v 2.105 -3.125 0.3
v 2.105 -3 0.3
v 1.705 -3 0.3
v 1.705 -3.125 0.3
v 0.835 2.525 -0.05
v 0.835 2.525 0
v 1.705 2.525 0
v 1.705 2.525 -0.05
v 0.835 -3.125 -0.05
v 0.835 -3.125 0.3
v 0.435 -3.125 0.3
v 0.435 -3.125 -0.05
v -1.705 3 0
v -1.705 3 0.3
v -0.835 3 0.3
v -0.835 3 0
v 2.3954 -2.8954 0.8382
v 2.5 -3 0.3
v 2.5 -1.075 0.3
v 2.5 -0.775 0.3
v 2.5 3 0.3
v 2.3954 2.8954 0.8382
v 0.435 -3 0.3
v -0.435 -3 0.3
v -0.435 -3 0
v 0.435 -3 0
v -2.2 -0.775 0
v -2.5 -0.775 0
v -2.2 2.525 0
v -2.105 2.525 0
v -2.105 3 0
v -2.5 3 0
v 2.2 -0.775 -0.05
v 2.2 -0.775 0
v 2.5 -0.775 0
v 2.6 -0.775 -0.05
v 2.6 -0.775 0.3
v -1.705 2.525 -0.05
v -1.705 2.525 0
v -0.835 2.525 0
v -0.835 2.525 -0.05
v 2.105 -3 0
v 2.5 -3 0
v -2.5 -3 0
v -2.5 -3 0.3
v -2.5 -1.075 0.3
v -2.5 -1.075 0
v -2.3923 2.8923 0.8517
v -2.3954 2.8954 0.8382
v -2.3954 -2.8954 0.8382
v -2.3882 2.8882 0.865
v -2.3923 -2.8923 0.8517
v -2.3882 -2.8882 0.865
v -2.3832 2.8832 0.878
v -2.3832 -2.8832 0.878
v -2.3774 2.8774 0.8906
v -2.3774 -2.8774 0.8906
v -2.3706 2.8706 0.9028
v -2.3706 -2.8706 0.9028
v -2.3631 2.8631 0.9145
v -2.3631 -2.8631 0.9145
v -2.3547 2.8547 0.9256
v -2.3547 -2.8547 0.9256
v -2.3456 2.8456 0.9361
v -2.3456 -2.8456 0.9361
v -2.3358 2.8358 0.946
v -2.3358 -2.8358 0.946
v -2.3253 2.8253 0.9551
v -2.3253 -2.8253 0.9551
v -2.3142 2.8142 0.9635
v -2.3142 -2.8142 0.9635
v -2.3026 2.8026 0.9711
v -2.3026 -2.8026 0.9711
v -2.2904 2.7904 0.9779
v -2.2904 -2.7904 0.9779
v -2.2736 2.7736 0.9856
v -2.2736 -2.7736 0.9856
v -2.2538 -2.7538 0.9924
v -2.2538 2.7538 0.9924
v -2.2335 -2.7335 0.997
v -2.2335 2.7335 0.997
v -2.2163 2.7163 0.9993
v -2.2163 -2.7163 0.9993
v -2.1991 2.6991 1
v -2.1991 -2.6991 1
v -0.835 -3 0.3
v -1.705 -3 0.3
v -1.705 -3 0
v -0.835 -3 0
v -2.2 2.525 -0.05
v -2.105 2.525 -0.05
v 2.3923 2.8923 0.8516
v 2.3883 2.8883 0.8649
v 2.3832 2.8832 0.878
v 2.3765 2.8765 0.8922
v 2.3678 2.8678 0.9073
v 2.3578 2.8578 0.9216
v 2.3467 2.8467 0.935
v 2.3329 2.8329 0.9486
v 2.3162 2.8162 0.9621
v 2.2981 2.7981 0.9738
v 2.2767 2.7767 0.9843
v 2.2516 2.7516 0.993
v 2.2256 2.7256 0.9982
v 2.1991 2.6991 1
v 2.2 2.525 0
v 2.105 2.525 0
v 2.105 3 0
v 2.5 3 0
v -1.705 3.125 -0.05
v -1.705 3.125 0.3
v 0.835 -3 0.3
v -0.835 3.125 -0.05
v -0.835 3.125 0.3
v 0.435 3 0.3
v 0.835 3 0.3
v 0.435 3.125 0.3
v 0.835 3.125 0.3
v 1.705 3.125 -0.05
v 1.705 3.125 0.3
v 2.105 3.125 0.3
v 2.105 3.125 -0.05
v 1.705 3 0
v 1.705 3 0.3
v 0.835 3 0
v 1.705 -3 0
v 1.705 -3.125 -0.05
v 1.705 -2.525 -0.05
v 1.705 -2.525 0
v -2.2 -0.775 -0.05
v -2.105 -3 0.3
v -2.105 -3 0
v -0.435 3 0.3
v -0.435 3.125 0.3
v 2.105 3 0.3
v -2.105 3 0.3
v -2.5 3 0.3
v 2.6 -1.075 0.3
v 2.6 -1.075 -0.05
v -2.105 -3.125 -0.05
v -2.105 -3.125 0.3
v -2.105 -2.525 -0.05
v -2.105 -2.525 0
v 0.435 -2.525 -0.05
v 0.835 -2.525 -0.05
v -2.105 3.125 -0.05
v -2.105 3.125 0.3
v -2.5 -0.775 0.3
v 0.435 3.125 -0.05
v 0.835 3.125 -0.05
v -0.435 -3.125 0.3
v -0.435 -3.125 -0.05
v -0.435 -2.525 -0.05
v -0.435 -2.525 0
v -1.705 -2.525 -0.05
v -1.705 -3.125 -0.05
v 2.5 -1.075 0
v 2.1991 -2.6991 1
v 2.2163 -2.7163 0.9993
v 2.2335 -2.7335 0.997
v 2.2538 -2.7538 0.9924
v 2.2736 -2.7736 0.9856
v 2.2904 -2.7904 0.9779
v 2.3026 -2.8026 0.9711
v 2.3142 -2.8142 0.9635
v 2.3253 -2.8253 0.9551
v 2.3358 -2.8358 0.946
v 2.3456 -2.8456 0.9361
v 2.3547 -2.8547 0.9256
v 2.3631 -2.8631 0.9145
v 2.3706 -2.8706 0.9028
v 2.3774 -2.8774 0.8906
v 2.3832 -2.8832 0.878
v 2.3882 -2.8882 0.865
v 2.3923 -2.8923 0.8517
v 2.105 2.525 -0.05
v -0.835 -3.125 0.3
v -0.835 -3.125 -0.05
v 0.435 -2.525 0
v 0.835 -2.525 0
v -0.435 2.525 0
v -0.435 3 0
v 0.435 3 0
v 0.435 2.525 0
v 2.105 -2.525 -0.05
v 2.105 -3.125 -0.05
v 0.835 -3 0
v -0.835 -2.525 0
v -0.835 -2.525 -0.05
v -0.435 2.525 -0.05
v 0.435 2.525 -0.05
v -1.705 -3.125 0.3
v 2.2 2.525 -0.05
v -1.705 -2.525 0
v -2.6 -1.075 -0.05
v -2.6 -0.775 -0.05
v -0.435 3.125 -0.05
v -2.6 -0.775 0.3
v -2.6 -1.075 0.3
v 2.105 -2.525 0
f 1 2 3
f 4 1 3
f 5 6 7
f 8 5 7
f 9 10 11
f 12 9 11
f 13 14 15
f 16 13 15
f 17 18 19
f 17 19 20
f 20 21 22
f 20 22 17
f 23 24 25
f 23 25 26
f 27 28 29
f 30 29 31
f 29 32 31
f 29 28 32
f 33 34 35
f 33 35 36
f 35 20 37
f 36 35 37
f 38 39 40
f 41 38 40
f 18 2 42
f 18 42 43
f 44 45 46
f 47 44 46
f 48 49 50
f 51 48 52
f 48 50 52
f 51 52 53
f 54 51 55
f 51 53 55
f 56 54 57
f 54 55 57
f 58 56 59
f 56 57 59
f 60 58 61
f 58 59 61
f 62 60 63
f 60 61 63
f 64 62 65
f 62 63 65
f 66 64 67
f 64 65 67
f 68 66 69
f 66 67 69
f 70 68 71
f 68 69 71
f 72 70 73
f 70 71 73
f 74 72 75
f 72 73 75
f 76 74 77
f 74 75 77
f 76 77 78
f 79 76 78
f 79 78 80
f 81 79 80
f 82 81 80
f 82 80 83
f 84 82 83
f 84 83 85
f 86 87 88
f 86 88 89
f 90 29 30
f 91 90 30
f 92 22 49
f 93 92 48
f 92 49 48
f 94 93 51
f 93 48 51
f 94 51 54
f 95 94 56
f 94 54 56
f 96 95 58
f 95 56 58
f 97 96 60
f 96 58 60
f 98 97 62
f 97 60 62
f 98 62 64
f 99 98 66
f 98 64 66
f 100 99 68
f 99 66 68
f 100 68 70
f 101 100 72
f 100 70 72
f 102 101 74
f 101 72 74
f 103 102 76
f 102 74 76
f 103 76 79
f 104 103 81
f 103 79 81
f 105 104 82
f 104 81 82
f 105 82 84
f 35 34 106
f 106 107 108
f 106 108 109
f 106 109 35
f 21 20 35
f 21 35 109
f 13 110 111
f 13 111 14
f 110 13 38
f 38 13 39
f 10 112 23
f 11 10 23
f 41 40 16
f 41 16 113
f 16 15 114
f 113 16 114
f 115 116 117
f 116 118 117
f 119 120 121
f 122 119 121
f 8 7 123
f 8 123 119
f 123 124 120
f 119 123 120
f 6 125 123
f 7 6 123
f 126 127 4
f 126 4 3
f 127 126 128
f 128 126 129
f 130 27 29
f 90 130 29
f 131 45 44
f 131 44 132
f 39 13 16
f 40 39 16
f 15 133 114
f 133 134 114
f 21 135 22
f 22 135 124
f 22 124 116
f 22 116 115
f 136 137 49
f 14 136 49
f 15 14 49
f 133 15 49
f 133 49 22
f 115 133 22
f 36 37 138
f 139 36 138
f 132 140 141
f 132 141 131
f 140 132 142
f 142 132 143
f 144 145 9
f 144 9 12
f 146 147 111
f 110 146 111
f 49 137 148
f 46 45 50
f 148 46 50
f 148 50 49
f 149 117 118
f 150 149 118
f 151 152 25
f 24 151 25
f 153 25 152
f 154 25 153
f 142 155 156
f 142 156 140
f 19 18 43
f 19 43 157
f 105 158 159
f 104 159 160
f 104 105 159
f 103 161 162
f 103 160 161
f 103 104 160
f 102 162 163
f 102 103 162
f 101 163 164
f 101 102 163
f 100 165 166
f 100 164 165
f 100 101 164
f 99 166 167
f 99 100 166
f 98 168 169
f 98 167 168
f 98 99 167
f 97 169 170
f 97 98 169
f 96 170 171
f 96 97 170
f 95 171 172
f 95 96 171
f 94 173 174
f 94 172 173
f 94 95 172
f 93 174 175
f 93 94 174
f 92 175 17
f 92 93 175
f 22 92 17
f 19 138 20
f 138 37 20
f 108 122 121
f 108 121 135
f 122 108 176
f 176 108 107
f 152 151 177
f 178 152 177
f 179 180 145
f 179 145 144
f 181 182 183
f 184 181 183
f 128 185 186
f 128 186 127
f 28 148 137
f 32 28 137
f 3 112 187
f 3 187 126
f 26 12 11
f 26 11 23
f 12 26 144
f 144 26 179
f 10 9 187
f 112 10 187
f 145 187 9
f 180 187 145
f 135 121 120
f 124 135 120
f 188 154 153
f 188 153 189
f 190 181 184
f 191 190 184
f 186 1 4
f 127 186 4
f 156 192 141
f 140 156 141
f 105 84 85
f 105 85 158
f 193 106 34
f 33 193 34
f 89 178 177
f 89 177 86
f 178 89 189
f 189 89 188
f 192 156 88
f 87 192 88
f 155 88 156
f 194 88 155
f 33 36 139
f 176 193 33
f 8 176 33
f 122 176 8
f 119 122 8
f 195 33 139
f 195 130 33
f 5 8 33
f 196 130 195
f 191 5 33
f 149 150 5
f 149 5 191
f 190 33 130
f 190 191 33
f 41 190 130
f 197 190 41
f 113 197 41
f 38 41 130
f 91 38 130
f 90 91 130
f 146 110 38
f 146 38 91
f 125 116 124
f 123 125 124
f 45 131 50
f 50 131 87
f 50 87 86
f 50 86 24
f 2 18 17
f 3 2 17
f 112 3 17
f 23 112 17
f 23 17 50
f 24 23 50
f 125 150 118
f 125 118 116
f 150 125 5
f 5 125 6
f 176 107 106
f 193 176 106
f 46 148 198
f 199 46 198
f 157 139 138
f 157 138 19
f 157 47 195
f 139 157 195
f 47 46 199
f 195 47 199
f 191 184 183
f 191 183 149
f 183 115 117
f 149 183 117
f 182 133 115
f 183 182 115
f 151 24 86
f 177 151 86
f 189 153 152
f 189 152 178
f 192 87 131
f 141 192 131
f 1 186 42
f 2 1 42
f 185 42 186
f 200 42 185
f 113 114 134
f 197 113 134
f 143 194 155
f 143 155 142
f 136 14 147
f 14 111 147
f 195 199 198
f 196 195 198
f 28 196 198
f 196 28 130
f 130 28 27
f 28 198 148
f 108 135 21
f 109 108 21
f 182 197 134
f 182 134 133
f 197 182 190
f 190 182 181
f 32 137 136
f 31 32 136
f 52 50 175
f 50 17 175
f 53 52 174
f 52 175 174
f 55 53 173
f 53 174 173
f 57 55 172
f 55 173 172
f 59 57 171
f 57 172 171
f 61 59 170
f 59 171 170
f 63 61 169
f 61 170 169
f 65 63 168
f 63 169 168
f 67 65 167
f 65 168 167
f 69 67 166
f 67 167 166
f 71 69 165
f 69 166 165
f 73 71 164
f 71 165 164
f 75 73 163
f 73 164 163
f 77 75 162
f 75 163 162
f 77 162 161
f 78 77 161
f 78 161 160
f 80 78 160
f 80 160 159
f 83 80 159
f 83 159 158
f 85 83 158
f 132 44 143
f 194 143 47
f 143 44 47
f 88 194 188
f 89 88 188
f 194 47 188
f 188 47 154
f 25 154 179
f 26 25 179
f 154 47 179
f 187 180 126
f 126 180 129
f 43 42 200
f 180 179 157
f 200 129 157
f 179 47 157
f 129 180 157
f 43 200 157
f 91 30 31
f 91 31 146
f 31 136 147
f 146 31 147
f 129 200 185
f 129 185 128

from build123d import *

# Parameters (mm, degrees)
BOSS_EXTRUDE1_START           = 0.3
SKETCH1_W                     = 5
SKETCH1_H                     = 6
BOSS_EXTRUDE1_DEPTH           = 0.3
BOSS_EXTRUDE1_OTHER_WAY_DEPTH = 0.7
BOSS_EXTRUDE1_OTHER_WAY_TAPER = 11
FILLET1_R                     = 0.2
BOSS_EXTRUDE2_DEPTH           = 0.05
BOSS_EXTRUDE2_DEPTH_BACK      = 0.3
SKETCH3_W                     = 0.4
SKETCH3_H                     = 0.6


with BuildPart() as part:
    # Sketch1 → Boss-Extrude1 (new body)
    with BuildSketch(Plane.XY.offset(BOSS_EXTRUDE1_START)):
        Rectangle(SKETCH1_W, SKETCH1_H)
    extrude(amount=-BOSS_EXTRUDE1_DEPTH)

    # Sketch1 → Boss-Extrude1 other way (add)
    with BuildSketch(Plane.XY.offset(BOSS_EXTRUDE1_START)):
        Rectangle(SKETCH1_W, SKETCH1_H)
    extrude(amount=BOSS_EXTRUDE1_OTHER_WAY_DEPTH, taper=BOSS_EXTRUDE1_OTHER_WAY_TAPER)

    # Fillet1
    fillet1_edges = [part.edges().sort_by_distance(p)[0] for p in [
        (-2.363933784, 0, 1),
        (0, -2.863933784, 1),
        (2.363933784, 0, 1),
        (0, 2.863933784, 1),
    ]]
    fillet(fillet1_edges, radius=FILLET1_R)

    # Sketch3 → Boss-Extrude2 (add, two sides: drawn at the far end of the back side and taken through both)
    with BuildSketch(Plane(origin=(0, 0, 0), x_dir=(-1, 0, 0), z_dir=(0, 0, -1)).offset(-BOSS_EXTRUDE2_DEPTH_BACK)):
        with Locations((1.905, -2.825)):
            Rectangle(SKETCH3_W, SKETCH3_H)
        with Locations((0.635, -2.825)):
            Rectangle(SKETCH3_W, SKETCH3_H)
        with Locations((-0.635, -2.825)):
            Rectangle(SKETCH3_W, SKETCH3_H)
        with Locations((-1.905, -2.825)):
            Rectangle(SKETCH3_W, SKETCH3_H)
        Polygon((2.105, 2.525), (2.105, 3.125), (1.705, 3.125), (1.705, 2.525), (0.835, 2.525), (0.835, 3.125), (0.435, 3.125), (0.435, 2.525), (-0.435, 2.525), (-0.435, 3.125), (-0.835, 3.125), (-0.835, 2.525), (-1.705, 2.525), (-1.705, 3.125), (-2.105, 3.125), (-2.105, 2.525), (-2.2, 2.525), (-2.2, -0.775), (-2.6, -0.775), (-2.6, -1.075), (2.6, -1.075), (2.6, -0.775), (2.2, -0.775), (2.2, 2.525), align=None)
    extrude(amount=BOSS_EXTRUDE2_DEPTH + BOSS_EXTRUDE2_DEPTH_BACK)


solid = part.part
